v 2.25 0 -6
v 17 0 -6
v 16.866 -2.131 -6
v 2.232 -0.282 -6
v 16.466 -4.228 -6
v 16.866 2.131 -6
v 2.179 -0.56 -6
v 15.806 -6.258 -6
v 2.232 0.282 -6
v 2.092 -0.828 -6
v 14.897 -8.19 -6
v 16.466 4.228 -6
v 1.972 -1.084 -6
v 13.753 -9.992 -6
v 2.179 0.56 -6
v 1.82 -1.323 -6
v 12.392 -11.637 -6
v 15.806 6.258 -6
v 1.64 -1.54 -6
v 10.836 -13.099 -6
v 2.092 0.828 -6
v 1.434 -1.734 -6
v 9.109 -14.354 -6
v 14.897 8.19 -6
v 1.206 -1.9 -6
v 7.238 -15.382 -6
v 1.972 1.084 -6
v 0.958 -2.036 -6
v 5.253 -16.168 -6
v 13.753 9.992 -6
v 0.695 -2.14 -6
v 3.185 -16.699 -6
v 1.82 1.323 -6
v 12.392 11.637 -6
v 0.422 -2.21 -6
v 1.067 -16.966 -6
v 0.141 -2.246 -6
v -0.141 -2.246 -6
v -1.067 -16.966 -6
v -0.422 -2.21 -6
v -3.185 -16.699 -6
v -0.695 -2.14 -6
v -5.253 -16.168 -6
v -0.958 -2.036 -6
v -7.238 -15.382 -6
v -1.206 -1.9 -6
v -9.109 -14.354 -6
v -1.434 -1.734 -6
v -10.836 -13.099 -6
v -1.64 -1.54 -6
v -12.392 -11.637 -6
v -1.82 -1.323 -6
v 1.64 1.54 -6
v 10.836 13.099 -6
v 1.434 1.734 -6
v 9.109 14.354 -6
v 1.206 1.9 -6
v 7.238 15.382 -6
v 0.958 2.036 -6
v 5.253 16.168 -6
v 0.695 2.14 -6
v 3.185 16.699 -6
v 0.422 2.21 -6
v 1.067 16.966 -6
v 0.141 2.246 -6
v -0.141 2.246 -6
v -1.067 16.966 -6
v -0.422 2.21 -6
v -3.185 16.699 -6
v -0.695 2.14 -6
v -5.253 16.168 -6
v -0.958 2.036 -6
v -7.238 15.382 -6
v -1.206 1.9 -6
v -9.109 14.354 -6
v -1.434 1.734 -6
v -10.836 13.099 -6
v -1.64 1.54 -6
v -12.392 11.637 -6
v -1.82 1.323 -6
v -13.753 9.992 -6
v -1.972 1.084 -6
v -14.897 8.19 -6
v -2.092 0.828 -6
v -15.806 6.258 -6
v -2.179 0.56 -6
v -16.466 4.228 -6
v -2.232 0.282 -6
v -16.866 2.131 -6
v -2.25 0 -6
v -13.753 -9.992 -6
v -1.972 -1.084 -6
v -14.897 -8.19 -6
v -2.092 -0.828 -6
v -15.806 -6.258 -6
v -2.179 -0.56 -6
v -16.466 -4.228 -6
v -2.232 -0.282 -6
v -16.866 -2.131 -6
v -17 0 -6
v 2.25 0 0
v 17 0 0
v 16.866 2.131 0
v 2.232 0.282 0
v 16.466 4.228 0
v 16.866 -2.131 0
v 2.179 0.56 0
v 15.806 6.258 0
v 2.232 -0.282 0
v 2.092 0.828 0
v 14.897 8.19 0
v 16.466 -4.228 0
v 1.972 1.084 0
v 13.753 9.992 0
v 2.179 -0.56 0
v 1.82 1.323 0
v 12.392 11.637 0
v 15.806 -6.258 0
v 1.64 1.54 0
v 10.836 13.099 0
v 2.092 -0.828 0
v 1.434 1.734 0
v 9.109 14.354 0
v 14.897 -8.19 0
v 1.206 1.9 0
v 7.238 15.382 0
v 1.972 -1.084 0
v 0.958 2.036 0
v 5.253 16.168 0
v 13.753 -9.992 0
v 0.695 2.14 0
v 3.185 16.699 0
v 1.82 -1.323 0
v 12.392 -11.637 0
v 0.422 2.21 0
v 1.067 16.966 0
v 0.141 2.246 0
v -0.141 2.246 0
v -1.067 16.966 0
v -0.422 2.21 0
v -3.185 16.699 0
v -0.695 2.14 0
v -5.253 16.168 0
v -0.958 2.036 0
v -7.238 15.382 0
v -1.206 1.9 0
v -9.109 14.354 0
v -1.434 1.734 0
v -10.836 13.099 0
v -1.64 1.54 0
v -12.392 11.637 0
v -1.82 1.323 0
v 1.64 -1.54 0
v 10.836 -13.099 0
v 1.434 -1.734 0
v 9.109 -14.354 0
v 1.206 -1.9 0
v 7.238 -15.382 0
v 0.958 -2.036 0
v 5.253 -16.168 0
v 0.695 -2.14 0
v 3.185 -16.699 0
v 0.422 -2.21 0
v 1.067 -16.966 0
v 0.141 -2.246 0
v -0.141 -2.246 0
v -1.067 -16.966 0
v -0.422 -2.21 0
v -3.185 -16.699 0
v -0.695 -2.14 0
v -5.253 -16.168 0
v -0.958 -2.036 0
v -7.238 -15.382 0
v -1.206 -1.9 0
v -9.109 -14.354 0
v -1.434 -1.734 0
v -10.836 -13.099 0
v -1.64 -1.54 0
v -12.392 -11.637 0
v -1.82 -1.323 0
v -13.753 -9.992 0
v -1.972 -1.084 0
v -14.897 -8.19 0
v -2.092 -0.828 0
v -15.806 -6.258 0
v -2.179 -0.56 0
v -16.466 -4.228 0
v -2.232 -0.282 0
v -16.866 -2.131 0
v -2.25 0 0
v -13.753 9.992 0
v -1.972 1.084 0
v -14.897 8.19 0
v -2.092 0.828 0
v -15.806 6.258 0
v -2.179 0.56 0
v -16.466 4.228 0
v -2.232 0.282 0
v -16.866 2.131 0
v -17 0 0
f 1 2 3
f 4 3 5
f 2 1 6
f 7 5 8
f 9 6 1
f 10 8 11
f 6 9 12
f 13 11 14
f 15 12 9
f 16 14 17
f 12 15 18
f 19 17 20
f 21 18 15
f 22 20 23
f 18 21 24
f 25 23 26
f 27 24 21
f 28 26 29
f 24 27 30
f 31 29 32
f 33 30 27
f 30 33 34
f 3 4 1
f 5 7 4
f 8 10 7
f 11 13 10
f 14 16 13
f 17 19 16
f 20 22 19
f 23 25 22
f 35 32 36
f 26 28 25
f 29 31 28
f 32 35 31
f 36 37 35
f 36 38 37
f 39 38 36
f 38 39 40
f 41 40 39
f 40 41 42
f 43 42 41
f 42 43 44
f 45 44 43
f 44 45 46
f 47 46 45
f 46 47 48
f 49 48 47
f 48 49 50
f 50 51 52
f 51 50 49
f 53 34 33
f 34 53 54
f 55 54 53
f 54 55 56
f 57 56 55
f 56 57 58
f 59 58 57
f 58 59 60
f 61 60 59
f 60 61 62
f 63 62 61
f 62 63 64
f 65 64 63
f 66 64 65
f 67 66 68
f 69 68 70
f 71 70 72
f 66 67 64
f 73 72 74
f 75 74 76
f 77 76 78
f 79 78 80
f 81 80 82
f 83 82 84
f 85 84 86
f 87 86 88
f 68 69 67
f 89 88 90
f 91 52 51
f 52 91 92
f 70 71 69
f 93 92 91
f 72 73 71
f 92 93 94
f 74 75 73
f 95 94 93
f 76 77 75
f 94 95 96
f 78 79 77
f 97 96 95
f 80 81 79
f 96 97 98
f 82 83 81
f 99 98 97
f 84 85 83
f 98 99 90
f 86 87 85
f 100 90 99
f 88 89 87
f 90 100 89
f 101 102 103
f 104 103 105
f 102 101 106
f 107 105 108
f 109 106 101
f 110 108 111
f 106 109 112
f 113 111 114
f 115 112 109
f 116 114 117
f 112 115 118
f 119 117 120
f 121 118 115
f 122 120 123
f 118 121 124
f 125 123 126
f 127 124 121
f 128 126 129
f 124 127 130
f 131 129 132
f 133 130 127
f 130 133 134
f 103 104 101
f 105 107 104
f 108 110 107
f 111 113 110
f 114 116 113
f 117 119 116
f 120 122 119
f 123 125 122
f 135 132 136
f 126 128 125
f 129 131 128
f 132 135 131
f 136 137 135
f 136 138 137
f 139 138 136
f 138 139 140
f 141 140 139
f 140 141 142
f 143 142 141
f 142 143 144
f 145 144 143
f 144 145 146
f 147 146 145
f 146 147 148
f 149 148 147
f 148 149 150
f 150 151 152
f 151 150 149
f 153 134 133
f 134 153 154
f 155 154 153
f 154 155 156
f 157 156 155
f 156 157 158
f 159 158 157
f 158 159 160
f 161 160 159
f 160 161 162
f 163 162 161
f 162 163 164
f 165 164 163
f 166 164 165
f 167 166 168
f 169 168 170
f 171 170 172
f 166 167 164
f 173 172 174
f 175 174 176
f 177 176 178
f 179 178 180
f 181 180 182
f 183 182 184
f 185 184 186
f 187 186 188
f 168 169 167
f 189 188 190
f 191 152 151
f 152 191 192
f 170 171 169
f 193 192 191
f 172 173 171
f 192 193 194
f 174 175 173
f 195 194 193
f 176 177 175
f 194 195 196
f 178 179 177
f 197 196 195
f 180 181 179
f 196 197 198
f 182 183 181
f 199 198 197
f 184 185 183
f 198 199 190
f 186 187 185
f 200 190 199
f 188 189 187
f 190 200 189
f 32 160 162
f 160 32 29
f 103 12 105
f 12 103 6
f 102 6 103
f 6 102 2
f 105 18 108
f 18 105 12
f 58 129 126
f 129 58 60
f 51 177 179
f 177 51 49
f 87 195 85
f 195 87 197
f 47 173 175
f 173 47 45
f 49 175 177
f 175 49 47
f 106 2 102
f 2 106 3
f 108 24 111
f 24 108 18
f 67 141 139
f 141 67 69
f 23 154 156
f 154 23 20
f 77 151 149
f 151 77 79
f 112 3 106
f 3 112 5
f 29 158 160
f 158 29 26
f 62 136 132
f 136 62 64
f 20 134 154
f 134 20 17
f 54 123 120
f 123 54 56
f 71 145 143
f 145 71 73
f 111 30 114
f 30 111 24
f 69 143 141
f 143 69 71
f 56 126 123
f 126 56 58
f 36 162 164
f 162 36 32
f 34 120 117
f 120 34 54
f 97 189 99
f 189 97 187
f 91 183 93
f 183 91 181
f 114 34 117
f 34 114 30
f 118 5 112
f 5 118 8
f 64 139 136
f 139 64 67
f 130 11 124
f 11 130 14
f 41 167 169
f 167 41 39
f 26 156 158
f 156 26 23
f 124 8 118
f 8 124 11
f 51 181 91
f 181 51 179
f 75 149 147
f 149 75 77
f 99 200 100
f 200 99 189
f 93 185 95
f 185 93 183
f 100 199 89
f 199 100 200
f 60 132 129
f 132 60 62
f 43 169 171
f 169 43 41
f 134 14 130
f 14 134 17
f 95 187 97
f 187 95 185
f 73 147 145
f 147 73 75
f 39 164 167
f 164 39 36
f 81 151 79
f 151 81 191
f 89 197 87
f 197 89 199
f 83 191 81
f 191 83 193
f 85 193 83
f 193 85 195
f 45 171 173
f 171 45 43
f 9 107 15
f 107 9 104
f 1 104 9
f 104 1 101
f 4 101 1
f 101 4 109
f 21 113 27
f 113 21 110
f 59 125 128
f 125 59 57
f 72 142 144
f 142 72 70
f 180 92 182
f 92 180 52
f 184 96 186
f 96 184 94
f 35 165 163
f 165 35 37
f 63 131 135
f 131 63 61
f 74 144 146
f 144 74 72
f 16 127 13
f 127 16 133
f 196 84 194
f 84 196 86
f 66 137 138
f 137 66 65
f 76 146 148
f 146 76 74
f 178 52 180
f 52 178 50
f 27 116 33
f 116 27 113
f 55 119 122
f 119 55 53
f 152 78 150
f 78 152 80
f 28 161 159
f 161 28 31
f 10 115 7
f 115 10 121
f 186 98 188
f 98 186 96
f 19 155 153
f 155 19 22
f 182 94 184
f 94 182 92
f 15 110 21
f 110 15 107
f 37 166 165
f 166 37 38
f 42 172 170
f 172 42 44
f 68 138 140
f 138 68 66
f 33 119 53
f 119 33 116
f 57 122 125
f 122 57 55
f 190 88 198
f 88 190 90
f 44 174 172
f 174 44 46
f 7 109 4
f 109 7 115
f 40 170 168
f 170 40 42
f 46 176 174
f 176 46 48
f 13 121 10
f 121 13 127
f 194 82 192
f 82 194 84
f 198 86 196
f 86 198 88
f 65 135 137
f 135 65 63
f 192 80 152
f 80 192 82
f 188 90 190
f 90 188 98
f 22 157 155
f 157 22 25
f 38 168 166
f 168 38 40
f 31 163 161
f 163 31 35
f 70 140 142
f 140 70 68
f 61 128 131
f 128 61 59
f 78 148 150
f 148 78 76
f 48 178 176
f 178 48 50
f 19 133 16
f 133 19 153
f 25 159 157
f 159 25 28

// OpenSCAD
$fn = 50;


difference() {
	union() {
		translate(v = [0, 0, -6.0000000000]) {
			cylinder(h = 6, r = 7.0000000000);
		}
		translate(v = [0, 0, -6.0000000000]) {
			cylinder(h = 6, r = 17.0000000000);
		}
	}
	union() {
		#translate(v = [0, 0, -6]) {
			cylinder(h = 6, r = 2.2500000000);
		}
	}
}
